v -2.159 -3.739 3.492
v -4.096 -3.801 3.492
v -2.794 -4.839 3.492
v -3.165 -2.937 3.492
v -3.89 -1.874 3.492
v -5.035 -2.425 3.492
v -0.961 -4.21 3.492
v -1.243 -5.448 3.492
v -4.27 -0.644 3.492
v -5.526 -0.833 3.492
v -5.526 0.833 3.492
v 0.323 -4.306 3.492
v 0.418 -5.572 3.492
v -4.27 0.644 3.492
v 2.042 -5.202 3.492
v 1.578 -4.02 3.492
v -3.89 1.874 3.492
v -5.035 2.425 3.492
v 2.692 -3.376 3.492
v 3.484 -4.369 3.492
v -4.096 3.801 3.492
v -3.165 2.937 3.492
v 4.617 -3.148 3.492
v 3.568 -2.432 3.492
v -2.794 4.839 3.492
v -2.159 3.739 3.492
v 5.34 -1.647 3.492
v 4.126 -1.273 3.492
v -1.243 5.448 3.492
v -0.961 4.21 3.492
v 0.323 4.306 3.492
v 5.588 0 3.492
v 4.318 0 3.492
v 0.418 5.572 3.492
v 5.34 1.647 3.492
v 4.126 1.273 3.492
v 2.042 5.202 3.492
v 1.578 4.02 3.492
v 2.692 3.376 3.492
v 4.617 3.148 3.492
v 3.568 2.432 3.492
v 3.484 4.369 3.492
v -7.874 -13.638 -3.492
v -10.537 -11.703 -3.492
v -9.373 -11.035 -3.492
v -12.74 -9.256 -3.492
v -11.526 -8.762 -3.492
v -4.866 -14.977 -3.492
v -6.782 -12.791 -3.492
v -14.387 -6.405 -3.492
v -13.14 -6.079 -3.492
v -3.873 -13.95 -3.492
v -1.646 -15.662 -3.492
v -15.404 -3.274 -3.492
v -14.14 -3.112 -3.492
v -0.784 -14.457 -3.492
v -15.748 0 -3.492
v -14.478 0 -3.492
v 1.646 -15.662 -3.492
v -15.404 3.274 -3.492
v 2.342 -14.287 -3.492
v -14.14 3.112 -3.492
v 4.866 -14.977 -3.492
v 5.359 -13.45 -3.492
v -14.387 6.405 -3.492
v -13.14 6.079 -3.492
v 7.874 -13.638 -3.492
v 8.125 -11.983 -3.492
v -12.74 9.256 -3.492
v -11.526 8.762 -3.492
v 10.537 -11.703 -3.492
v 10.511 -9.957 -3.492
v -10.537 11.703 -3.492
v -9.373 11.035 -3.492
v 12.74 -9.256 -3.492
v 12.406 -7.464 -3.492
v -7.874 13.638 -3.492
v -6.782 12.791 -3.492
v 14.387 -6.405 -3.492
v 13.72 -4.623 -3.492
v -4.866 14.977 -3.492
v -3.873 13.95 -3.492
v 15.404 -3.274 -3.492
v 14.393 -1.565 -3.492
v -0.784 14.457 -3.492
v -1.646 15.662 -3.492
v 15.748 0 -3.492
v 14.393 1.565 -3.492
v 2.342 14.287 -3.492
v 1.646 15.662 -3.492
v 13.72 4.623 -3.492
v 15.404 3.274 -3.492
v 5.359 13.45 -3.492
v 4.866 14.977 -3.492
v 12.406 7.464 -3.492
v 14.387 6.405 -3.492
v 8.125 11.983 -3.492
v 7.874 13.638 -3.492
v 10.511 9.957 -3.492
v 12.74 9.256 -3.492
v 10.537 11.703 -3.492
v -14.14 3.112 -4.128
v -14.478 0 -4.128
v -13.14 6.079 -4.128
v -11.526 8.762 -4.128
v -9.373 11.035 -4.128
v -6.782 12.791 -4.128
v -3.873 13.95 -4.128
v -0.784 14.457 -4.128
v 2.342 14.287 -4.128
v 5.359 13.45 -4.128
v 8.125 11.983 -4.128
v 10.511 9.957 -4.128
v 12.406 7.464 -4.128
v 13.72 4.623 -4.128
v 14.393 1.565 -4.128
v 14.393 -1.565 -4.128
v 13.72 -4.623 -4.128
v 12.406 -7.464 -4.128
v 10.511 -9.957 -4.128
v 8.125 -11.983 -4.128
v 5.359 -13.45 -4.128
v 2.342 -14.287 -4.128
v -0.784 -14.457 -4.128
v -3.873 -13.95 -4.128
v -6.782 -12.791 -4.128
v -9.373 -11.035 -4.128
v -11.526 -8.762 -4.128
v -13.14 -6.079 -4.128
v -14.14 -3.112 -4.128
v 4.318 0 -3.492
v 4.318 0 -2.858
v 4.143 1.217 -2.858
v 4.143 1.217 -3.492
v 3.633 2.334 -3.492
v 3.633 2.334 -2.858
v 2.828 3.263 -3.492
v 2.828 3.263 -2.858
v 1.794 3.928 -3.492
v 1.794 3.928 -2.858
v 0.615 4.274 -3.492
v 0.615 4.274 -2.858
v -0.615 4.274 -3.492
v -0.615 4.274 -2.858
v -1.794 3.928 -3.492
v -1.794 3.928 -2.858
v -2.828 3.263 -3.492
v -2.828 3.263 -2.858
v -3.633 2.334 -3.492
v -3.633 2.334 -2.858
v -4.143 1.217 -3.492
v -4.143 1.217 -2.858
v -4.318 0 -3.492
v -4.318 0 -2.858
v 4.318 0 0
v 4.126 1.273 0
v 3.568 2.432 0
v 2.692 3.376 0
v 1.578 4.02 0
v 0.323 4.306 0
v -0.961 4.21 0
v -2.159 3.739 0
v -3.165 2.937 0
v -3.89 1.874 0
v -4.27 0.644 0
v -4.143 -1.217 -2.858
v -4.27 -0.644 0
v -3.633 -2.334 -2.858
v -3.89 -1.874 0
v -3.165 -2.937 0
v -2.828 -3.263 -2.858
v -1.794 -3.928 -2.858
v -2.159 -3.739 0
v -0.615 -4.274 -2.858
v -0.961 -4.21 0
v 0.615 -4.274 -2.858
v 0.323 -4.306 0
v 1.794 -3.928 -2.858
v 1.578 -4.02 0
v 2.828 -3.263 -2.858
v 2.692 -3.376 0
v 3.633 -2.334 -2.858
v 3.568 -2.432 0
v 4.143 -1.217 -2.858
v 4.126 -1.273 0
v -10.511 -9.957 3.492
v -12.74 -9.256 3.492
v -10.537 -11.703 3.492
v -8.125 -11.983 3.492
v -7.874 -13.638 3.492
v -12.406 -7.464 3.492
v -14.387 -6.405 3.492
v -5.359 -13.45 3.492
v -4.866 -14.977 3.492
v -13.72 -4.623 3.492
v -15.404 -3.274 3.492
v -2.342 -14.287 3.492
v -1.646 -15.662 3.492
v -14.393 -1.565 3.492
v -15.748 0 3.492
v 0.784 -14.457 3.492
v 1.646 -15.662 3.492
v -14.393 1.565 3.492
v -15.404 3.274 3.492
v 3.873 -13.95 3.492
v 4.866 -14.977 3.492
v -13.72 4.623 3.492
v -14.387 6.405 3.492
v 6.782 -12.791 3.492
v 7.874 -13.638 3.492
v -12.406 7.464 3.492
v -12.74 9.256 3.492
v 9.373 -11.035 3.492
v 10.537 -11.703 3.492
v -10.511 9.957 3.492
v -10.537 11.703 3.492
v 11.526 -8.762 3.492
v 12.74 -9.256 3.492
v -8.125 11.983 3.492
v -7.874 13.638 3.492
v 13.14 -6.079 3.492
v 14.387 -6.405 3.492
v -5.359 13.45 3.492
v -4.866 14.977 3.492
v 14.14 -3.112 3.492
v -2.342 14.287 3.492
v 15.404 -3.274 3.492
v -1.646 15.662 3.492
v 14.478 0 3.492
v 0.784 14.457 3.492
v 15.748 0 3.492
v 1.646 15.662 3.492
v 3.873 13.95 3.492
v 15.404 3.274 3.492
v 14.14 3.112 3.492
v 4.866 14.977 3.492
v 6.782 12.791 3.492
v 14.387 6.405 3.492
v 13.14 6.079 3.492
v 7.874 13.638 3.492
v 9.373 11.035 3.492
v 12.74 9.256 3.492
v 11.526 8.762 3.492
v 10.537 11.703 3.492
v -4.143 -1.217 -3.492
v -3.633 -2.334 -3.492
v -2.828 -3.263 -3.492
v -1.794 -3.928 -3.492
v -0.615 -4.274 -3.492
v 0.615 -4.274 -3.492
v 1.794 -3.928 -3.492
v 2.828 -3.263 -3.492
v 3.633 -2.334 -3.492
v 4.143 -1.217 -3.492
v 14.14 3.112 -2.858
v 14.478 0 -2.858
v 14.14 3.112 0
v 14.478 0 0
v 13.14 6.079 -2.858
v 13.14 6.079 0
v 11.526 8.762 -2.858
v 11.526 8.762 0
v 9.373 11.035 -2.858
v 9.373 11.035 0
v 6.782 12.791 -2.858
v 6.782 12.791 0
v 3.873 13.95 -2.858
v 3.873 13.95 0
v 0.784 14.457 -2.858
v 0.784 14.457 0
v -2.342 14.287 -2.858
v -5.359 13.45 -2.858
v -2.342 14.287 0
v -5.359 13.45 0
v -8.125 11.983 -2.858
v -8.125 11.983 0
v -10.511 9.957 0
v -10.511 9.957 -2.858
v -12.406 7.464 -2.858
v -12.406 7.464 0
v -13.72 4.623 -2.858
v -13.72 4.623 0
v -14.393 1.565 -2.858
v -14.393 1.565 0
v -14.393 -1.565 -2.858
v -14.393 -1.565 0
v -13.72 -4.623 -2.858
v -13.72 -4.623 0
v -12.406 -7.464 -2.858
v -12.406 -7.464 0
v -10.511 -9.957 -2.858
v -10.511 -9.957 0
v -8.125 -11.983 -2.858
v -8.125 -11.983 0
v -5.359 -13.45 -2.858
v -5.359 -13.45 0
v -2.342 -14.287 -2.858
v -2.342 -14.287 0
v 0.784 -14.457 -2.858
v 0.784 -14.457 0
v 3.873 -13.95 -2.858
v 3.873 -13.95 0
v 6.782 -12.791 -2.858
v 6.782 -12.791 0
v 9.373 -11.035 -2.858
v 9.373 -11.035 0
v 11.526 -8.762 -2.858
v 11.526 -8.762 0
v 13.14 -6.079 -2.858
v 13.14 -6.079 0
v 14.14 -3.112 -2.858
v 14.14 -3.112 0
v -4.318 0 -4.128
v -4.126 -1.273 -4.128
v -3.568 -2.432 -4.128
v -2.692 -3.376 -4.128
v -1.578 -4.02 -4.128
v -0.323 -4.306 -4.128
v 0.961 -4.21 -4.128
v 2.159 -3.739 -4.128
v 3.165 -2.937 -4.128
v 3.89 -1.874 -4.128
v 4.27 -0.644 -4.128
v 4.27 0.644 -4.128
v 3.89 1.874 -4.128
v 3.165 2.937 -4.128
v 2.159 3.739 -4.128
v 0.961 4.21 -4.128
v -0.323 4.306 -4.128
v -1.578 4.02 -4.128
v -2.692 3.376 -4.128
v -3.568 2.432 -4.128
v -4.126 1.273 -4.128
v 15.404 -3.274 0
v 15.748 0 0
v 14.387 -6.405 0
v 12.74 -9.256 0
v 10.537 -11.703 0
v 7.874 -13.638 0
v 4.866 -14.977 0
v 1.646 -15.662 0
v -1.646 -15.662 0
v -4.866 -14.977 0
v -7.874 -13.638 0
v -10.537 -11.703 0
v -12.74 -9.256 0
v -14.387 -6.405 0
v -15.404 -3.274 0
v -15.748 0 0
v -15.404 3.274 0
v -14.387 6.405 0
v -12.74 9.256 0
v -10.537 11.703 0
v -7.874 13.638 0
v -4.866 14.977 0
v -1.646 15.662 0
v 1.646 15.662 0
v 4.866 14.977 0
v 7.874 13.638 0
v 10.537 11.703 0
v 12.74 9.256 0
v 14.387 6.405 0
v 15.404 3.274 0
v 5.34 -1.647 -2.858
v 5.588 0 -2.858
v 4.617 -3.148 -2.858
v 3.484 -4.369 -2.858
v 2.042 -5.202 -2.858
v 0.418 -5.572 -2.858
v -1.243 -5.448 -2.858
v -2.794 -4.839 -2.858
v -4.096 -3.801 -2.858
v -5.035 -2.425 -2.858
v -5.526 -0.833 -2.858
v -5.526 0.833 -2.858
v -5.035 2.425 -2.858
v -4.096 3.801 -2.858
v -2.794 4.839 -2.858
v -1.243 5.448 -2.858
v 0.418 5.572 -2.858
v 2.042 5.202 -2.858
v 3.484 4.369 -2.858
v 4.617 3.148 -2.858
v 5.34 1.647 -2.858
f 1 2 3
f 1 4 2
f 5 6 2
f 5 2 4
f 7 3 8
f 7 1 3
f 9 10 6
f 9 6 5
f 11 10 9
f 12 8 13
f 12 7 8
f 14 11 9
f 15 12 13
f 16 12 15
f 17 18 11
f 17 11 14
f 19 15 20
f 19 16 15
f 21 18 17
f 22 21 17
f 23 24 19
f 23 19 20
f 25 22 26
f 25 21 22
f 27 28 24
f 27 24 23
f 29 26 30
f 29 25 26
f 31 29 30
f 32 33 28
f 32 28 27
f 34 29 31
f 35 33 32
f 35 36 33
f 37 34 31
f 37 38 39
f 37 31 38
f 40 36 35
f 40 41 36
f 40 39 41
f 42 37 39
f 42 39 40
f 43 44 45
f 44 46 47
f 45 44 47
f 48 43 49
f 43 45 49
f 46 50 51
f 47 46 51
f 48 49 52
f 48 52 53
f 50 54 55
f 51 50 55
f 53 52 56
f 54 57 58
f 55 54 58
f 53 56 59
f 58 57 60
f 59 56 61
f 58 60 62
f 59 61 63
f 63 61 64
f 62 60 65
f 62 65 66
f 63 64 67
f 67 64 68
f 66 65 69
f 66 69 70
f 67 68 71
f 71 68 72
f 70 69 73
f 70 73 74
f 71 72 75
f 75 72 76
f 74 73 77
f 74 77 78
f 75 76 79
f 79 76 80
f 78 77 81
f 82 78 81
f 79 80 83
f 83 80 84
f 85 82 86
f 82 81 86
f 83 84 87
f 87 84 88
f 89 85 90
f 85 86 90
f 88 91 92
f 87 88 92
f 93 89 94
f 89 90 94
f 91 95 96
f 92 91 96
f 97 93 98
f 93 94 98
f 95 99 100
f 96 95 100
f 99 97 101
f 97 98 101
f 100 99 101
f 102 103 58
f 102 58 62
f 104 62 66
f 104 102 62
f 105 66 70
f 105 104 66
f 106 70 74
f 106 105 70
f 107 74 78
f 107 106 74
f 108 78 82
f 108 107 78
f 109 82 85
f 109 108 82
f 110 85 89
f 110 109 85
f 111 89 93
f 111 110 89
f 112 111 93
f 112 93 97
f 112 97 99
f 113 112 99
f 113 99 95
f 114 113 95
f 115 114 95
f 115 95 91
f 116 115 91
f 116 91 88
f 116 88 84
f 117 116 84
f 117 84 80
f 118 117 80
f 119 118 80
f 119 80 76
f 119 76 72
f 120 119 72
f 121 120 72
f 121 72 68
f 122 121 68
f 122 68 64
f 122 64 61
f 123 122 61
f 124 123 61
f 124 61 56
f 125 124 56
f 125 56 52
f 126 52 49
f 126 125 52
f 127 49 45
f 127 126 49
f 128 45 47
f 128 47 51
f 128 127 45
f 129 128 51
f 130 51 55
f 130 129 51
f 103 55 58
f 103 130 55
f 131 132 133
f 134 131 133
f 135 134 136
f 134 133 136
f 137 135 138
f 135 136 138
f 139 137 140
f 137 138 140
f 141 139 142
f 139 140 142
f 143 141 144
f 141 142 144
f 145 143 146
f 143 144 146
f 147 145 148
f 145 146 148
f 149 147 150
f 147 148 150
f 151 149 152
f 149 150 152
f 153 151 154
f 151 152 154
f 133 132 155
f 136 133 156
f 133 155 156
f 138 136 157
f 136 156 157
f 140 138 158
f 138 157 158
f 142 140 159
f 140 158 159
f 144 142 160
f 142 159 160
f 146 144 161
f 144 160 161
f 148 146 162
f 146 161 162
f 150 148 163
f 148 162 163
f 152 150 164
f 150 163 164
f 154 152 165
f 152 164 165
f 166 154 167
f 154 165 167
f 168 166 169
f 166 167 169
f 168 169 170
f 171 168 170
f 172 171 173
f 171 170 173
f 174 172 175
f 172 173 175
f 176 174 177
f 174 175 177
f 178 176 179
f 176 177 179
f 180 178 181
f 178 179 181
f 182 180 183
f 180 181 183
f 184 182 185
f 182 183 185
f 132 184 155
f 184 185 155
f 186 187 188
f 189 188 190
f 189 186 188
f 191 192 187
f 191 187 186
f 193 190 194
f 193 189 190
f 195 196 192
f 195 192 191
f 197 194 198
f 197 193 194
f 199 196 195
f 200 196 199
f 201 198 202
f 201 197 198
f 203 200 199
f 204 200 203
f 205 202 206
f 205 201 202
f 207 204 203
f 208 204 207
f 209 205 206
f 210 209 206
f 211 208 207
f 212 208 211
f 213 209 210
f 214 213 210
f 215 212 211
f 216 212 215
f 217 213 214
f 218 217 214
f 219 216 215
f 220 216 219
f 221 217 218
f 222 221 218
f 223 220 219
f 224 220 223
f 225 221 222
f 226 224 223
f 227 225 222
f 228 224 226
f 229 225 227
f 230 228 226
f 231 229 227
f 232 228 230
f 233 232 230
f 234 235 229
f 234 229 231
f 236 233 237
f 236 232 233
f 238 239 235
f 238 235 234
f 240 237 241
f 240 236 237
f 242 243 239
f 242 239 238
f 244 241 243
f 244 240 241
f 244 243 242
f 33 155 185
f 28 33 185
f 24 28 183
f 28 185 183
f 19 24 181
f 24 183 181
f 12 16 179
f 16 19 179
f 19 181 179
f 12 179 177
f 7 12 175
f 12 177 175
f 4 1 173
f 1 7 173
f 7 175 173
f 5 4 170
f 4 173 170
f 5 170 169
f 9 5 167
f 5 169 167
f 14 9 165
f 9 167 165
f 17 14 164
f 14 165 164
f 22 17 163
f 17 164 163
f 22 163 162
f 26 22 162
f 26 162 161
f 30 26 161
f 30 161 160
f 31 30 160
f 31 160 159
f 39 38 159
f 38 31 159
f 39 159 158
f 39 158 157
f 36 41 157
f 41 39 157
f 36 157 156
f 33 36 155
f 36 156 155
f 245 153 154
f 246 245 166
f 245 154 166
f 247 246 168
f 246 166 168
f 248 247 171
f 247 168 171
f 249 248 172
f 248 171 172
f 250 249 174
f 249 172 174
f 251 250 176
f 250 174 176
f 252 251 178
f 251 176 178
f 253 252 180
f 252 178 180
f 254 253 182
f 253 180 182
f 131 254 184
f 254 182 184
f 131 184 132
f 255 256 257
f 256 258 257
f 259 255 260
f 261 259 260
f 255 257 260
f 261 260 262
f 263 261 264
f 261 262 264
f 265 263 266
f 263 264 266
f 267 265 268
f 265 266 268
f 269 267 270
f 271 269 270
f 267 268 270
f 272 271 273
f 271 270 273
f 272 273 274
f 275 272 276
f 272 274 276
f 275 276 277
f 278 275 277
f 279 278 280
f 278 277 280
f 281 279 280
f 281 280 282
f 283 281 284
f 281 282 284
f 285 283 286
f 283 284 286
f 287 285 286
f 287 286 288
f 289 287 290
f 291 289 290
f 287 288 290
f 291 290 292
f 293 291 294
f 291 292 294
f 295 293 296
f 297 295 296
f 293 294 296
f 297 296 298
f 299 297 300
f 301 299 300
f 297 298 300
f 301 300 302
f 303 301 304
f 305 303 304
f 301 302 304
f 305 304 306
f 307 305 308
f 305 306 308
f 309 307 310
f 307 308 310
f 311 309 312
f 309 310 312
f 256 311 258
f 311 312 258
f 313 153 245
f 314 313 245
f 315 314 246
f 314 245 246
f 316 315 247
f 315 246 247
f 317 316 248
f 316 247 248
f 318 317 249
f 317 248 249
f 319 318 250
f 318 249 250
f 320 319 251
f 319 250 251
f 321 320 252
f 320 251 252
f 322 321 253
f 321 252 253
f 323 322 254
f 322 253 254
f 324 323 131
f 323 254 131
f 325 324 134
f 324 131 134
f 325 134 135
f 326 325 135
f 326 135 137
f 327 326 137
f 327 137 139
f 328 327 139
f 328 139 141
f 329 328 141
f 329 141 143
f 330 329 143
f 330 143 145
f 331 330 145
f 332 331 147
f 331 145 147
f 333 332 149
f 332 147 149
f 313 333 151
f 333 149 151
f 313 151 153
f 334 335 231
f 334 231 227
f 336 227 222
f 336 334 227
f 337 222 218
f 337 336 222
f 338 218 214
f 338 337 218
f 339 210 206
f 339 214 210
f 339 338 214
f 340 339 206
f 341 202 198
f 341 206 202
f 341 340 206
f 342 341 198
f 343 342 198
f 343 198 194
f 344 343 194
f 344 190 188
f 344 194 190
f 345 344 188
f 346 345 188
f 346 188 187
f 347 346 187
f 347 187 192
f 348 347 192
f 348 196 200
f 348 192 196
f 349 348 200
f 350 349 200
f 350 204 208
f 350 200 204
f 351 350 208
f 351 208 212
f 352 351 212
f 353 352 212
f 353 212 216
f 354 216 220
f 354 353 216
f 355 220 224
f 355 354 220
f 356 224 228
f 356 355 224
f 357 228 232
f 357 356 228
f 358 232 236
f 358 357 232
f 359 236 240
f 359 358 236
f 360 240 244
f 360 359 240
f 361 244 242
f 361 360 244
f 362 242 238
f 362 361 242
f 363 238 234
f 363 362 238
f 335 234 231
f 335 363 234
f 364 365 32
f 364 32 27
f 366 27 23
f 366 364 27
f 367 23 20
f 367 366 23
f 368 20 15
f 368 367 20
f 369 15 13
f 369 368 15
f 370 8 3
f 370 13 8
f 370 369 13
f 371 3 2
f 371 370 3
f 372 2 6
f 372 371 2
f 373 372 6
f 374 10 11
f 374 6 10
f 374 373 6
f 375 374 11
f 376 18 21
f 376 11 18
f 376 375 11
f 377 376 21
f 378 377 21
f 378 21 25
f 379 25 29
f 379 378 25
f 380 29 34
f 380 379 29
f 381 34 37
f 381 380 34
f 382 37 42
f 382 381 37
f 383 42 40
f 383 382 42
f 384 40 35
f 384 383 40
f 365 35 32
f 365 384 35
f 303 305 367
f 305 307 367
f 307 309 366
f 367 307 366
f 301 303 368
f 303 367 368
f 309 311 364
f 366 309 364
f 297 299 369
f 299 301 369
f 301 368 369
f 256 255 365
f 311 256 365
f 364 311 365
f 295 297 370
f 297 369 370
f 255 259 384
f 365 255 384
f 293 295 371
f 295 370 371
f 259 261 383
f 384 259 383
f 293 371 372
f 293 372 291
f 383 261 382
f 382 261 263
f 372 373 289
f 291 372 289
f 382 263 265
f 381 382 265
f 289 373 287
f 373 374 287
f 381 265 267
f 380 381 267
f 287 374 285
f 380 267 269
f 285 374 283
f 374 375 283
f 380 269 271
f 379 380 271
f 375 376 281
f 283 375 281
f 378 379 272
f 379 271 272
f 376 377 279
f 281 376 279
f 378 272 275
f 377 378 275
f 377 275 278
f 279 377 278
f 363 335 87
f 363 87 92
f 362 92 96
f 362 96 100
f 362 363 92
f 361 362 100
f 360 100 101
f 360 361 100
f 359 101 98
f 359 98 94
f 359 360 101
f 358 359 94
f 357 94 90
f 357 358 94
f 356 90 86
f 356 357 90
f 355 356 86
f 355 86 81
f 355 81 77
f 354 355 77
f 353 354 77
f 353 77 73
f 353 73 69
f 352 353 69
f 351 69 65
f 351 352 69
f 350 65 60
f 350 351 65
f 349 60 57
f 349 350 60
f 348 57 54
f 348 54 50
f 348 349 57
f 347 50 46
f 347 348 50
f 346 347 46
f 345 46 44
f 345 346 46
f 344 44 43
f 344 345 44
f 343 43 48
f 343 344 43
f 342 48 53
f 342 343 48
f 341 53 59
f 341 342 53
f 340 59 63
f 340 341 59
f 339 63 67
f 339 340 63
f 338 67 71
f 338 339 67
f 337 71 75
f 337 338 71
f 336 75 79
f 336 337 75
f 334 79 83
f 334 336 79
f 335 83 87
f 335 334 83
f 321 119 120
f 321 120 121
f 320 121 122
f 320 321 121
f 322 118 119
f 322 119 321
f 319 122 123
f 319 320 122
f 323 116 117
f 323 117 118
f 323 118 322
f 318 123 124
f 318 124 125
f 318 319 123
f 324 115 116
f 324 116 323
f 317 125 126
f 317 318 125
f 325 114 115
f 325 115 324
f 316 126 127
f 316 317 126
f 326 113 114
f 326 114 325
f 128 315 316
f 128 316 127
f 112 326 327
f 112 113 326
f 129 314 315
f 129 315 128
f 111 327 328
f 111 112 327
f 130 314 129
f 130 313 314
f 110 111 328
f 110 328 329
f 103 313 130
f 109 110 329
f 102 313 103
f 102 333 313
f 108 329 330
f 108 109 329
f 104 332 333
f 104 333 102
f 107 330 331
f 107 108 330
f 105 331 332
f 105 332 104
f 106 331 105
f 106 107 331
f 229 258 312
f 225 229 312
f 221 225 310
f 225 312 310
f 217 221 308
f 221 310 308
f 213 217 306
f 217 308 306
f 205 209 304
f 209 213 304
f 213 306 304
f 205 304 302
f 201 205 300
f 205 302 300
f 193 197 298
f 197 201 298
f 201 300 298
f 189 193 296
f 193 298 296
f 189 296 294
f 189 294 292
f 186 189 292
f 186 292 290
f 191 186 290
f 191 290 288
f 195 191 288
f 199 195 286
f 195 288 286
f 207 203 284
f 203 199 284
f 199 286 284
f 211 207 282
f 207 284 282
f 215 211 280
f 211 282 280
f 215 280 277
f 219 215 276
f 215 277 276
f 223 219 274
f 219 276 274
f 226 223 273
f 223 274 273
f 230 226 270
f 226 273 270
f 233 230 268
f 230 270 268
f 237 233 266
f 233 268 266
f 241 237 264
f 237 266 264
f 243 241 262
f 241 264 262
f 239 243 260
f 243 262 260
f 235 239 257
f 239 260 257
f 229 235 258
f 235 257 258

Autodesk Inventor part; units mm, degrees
ref_plane "YZ Plane" through (0, 0, 0) normal (1, 0, 0) x (0, 1, 0)
ref_plane "XZ Plane" through (0, 0, 0) normal (0, 1, 0) x (-1, 0, 0)
ref_plane "XY Plane" through (0, 0, 0) normal (0, 0, 1) x (1, 0, 0)
sketch "Sketch1" plane through (0, 0, 0) normal (0, 0, 1) x (1, 0, 0)
  circle A0 centre (0, 0) radius 5.588
  circle A1 centre (0, 0) radius 4.318
  circle A2 centre (0, 0) radius 14.478
  circle A3 centre (0, 0) radius 15.748
  dimension "d1" = 11.176
  dimension "d2" = 1.27
  dimension "d3" = 8.89
  dimension "d4" = 1.27
extrude "Extrusion1" add sketch "Sketch1" along normal mid plane 6.985
sketch "Sketch5" plane through (0, 0, -3.4925) normal (0, 0, -1) x (-1, 0, 0)
  circle A0 centre (0, 0) radius 14.478 projected
  circle A1 centre (0, 0) radius 15.748 projected
  circle A2 centre (0, 0) radius 4.318 projected
  circle A3 centre (0, 0) radius 5.588 projected
extrude "Extrusion3" add sketch "Sketch5" along normal mid plane 1.27 contours A0 | A3
sketch "Sketch6" plane through (0, 0, -4.1275) normal (0, 0, -1) x (-1, 0, 0)
  circle A0 centre (0, 0) radius 14.478 projected
  arc A1 (-3.1559, 14.1299) -> (3.1559, 14.1299) centre (0, 14.478) ccw
  dimension "d17" = 6.35
properties part number "Wheel"
